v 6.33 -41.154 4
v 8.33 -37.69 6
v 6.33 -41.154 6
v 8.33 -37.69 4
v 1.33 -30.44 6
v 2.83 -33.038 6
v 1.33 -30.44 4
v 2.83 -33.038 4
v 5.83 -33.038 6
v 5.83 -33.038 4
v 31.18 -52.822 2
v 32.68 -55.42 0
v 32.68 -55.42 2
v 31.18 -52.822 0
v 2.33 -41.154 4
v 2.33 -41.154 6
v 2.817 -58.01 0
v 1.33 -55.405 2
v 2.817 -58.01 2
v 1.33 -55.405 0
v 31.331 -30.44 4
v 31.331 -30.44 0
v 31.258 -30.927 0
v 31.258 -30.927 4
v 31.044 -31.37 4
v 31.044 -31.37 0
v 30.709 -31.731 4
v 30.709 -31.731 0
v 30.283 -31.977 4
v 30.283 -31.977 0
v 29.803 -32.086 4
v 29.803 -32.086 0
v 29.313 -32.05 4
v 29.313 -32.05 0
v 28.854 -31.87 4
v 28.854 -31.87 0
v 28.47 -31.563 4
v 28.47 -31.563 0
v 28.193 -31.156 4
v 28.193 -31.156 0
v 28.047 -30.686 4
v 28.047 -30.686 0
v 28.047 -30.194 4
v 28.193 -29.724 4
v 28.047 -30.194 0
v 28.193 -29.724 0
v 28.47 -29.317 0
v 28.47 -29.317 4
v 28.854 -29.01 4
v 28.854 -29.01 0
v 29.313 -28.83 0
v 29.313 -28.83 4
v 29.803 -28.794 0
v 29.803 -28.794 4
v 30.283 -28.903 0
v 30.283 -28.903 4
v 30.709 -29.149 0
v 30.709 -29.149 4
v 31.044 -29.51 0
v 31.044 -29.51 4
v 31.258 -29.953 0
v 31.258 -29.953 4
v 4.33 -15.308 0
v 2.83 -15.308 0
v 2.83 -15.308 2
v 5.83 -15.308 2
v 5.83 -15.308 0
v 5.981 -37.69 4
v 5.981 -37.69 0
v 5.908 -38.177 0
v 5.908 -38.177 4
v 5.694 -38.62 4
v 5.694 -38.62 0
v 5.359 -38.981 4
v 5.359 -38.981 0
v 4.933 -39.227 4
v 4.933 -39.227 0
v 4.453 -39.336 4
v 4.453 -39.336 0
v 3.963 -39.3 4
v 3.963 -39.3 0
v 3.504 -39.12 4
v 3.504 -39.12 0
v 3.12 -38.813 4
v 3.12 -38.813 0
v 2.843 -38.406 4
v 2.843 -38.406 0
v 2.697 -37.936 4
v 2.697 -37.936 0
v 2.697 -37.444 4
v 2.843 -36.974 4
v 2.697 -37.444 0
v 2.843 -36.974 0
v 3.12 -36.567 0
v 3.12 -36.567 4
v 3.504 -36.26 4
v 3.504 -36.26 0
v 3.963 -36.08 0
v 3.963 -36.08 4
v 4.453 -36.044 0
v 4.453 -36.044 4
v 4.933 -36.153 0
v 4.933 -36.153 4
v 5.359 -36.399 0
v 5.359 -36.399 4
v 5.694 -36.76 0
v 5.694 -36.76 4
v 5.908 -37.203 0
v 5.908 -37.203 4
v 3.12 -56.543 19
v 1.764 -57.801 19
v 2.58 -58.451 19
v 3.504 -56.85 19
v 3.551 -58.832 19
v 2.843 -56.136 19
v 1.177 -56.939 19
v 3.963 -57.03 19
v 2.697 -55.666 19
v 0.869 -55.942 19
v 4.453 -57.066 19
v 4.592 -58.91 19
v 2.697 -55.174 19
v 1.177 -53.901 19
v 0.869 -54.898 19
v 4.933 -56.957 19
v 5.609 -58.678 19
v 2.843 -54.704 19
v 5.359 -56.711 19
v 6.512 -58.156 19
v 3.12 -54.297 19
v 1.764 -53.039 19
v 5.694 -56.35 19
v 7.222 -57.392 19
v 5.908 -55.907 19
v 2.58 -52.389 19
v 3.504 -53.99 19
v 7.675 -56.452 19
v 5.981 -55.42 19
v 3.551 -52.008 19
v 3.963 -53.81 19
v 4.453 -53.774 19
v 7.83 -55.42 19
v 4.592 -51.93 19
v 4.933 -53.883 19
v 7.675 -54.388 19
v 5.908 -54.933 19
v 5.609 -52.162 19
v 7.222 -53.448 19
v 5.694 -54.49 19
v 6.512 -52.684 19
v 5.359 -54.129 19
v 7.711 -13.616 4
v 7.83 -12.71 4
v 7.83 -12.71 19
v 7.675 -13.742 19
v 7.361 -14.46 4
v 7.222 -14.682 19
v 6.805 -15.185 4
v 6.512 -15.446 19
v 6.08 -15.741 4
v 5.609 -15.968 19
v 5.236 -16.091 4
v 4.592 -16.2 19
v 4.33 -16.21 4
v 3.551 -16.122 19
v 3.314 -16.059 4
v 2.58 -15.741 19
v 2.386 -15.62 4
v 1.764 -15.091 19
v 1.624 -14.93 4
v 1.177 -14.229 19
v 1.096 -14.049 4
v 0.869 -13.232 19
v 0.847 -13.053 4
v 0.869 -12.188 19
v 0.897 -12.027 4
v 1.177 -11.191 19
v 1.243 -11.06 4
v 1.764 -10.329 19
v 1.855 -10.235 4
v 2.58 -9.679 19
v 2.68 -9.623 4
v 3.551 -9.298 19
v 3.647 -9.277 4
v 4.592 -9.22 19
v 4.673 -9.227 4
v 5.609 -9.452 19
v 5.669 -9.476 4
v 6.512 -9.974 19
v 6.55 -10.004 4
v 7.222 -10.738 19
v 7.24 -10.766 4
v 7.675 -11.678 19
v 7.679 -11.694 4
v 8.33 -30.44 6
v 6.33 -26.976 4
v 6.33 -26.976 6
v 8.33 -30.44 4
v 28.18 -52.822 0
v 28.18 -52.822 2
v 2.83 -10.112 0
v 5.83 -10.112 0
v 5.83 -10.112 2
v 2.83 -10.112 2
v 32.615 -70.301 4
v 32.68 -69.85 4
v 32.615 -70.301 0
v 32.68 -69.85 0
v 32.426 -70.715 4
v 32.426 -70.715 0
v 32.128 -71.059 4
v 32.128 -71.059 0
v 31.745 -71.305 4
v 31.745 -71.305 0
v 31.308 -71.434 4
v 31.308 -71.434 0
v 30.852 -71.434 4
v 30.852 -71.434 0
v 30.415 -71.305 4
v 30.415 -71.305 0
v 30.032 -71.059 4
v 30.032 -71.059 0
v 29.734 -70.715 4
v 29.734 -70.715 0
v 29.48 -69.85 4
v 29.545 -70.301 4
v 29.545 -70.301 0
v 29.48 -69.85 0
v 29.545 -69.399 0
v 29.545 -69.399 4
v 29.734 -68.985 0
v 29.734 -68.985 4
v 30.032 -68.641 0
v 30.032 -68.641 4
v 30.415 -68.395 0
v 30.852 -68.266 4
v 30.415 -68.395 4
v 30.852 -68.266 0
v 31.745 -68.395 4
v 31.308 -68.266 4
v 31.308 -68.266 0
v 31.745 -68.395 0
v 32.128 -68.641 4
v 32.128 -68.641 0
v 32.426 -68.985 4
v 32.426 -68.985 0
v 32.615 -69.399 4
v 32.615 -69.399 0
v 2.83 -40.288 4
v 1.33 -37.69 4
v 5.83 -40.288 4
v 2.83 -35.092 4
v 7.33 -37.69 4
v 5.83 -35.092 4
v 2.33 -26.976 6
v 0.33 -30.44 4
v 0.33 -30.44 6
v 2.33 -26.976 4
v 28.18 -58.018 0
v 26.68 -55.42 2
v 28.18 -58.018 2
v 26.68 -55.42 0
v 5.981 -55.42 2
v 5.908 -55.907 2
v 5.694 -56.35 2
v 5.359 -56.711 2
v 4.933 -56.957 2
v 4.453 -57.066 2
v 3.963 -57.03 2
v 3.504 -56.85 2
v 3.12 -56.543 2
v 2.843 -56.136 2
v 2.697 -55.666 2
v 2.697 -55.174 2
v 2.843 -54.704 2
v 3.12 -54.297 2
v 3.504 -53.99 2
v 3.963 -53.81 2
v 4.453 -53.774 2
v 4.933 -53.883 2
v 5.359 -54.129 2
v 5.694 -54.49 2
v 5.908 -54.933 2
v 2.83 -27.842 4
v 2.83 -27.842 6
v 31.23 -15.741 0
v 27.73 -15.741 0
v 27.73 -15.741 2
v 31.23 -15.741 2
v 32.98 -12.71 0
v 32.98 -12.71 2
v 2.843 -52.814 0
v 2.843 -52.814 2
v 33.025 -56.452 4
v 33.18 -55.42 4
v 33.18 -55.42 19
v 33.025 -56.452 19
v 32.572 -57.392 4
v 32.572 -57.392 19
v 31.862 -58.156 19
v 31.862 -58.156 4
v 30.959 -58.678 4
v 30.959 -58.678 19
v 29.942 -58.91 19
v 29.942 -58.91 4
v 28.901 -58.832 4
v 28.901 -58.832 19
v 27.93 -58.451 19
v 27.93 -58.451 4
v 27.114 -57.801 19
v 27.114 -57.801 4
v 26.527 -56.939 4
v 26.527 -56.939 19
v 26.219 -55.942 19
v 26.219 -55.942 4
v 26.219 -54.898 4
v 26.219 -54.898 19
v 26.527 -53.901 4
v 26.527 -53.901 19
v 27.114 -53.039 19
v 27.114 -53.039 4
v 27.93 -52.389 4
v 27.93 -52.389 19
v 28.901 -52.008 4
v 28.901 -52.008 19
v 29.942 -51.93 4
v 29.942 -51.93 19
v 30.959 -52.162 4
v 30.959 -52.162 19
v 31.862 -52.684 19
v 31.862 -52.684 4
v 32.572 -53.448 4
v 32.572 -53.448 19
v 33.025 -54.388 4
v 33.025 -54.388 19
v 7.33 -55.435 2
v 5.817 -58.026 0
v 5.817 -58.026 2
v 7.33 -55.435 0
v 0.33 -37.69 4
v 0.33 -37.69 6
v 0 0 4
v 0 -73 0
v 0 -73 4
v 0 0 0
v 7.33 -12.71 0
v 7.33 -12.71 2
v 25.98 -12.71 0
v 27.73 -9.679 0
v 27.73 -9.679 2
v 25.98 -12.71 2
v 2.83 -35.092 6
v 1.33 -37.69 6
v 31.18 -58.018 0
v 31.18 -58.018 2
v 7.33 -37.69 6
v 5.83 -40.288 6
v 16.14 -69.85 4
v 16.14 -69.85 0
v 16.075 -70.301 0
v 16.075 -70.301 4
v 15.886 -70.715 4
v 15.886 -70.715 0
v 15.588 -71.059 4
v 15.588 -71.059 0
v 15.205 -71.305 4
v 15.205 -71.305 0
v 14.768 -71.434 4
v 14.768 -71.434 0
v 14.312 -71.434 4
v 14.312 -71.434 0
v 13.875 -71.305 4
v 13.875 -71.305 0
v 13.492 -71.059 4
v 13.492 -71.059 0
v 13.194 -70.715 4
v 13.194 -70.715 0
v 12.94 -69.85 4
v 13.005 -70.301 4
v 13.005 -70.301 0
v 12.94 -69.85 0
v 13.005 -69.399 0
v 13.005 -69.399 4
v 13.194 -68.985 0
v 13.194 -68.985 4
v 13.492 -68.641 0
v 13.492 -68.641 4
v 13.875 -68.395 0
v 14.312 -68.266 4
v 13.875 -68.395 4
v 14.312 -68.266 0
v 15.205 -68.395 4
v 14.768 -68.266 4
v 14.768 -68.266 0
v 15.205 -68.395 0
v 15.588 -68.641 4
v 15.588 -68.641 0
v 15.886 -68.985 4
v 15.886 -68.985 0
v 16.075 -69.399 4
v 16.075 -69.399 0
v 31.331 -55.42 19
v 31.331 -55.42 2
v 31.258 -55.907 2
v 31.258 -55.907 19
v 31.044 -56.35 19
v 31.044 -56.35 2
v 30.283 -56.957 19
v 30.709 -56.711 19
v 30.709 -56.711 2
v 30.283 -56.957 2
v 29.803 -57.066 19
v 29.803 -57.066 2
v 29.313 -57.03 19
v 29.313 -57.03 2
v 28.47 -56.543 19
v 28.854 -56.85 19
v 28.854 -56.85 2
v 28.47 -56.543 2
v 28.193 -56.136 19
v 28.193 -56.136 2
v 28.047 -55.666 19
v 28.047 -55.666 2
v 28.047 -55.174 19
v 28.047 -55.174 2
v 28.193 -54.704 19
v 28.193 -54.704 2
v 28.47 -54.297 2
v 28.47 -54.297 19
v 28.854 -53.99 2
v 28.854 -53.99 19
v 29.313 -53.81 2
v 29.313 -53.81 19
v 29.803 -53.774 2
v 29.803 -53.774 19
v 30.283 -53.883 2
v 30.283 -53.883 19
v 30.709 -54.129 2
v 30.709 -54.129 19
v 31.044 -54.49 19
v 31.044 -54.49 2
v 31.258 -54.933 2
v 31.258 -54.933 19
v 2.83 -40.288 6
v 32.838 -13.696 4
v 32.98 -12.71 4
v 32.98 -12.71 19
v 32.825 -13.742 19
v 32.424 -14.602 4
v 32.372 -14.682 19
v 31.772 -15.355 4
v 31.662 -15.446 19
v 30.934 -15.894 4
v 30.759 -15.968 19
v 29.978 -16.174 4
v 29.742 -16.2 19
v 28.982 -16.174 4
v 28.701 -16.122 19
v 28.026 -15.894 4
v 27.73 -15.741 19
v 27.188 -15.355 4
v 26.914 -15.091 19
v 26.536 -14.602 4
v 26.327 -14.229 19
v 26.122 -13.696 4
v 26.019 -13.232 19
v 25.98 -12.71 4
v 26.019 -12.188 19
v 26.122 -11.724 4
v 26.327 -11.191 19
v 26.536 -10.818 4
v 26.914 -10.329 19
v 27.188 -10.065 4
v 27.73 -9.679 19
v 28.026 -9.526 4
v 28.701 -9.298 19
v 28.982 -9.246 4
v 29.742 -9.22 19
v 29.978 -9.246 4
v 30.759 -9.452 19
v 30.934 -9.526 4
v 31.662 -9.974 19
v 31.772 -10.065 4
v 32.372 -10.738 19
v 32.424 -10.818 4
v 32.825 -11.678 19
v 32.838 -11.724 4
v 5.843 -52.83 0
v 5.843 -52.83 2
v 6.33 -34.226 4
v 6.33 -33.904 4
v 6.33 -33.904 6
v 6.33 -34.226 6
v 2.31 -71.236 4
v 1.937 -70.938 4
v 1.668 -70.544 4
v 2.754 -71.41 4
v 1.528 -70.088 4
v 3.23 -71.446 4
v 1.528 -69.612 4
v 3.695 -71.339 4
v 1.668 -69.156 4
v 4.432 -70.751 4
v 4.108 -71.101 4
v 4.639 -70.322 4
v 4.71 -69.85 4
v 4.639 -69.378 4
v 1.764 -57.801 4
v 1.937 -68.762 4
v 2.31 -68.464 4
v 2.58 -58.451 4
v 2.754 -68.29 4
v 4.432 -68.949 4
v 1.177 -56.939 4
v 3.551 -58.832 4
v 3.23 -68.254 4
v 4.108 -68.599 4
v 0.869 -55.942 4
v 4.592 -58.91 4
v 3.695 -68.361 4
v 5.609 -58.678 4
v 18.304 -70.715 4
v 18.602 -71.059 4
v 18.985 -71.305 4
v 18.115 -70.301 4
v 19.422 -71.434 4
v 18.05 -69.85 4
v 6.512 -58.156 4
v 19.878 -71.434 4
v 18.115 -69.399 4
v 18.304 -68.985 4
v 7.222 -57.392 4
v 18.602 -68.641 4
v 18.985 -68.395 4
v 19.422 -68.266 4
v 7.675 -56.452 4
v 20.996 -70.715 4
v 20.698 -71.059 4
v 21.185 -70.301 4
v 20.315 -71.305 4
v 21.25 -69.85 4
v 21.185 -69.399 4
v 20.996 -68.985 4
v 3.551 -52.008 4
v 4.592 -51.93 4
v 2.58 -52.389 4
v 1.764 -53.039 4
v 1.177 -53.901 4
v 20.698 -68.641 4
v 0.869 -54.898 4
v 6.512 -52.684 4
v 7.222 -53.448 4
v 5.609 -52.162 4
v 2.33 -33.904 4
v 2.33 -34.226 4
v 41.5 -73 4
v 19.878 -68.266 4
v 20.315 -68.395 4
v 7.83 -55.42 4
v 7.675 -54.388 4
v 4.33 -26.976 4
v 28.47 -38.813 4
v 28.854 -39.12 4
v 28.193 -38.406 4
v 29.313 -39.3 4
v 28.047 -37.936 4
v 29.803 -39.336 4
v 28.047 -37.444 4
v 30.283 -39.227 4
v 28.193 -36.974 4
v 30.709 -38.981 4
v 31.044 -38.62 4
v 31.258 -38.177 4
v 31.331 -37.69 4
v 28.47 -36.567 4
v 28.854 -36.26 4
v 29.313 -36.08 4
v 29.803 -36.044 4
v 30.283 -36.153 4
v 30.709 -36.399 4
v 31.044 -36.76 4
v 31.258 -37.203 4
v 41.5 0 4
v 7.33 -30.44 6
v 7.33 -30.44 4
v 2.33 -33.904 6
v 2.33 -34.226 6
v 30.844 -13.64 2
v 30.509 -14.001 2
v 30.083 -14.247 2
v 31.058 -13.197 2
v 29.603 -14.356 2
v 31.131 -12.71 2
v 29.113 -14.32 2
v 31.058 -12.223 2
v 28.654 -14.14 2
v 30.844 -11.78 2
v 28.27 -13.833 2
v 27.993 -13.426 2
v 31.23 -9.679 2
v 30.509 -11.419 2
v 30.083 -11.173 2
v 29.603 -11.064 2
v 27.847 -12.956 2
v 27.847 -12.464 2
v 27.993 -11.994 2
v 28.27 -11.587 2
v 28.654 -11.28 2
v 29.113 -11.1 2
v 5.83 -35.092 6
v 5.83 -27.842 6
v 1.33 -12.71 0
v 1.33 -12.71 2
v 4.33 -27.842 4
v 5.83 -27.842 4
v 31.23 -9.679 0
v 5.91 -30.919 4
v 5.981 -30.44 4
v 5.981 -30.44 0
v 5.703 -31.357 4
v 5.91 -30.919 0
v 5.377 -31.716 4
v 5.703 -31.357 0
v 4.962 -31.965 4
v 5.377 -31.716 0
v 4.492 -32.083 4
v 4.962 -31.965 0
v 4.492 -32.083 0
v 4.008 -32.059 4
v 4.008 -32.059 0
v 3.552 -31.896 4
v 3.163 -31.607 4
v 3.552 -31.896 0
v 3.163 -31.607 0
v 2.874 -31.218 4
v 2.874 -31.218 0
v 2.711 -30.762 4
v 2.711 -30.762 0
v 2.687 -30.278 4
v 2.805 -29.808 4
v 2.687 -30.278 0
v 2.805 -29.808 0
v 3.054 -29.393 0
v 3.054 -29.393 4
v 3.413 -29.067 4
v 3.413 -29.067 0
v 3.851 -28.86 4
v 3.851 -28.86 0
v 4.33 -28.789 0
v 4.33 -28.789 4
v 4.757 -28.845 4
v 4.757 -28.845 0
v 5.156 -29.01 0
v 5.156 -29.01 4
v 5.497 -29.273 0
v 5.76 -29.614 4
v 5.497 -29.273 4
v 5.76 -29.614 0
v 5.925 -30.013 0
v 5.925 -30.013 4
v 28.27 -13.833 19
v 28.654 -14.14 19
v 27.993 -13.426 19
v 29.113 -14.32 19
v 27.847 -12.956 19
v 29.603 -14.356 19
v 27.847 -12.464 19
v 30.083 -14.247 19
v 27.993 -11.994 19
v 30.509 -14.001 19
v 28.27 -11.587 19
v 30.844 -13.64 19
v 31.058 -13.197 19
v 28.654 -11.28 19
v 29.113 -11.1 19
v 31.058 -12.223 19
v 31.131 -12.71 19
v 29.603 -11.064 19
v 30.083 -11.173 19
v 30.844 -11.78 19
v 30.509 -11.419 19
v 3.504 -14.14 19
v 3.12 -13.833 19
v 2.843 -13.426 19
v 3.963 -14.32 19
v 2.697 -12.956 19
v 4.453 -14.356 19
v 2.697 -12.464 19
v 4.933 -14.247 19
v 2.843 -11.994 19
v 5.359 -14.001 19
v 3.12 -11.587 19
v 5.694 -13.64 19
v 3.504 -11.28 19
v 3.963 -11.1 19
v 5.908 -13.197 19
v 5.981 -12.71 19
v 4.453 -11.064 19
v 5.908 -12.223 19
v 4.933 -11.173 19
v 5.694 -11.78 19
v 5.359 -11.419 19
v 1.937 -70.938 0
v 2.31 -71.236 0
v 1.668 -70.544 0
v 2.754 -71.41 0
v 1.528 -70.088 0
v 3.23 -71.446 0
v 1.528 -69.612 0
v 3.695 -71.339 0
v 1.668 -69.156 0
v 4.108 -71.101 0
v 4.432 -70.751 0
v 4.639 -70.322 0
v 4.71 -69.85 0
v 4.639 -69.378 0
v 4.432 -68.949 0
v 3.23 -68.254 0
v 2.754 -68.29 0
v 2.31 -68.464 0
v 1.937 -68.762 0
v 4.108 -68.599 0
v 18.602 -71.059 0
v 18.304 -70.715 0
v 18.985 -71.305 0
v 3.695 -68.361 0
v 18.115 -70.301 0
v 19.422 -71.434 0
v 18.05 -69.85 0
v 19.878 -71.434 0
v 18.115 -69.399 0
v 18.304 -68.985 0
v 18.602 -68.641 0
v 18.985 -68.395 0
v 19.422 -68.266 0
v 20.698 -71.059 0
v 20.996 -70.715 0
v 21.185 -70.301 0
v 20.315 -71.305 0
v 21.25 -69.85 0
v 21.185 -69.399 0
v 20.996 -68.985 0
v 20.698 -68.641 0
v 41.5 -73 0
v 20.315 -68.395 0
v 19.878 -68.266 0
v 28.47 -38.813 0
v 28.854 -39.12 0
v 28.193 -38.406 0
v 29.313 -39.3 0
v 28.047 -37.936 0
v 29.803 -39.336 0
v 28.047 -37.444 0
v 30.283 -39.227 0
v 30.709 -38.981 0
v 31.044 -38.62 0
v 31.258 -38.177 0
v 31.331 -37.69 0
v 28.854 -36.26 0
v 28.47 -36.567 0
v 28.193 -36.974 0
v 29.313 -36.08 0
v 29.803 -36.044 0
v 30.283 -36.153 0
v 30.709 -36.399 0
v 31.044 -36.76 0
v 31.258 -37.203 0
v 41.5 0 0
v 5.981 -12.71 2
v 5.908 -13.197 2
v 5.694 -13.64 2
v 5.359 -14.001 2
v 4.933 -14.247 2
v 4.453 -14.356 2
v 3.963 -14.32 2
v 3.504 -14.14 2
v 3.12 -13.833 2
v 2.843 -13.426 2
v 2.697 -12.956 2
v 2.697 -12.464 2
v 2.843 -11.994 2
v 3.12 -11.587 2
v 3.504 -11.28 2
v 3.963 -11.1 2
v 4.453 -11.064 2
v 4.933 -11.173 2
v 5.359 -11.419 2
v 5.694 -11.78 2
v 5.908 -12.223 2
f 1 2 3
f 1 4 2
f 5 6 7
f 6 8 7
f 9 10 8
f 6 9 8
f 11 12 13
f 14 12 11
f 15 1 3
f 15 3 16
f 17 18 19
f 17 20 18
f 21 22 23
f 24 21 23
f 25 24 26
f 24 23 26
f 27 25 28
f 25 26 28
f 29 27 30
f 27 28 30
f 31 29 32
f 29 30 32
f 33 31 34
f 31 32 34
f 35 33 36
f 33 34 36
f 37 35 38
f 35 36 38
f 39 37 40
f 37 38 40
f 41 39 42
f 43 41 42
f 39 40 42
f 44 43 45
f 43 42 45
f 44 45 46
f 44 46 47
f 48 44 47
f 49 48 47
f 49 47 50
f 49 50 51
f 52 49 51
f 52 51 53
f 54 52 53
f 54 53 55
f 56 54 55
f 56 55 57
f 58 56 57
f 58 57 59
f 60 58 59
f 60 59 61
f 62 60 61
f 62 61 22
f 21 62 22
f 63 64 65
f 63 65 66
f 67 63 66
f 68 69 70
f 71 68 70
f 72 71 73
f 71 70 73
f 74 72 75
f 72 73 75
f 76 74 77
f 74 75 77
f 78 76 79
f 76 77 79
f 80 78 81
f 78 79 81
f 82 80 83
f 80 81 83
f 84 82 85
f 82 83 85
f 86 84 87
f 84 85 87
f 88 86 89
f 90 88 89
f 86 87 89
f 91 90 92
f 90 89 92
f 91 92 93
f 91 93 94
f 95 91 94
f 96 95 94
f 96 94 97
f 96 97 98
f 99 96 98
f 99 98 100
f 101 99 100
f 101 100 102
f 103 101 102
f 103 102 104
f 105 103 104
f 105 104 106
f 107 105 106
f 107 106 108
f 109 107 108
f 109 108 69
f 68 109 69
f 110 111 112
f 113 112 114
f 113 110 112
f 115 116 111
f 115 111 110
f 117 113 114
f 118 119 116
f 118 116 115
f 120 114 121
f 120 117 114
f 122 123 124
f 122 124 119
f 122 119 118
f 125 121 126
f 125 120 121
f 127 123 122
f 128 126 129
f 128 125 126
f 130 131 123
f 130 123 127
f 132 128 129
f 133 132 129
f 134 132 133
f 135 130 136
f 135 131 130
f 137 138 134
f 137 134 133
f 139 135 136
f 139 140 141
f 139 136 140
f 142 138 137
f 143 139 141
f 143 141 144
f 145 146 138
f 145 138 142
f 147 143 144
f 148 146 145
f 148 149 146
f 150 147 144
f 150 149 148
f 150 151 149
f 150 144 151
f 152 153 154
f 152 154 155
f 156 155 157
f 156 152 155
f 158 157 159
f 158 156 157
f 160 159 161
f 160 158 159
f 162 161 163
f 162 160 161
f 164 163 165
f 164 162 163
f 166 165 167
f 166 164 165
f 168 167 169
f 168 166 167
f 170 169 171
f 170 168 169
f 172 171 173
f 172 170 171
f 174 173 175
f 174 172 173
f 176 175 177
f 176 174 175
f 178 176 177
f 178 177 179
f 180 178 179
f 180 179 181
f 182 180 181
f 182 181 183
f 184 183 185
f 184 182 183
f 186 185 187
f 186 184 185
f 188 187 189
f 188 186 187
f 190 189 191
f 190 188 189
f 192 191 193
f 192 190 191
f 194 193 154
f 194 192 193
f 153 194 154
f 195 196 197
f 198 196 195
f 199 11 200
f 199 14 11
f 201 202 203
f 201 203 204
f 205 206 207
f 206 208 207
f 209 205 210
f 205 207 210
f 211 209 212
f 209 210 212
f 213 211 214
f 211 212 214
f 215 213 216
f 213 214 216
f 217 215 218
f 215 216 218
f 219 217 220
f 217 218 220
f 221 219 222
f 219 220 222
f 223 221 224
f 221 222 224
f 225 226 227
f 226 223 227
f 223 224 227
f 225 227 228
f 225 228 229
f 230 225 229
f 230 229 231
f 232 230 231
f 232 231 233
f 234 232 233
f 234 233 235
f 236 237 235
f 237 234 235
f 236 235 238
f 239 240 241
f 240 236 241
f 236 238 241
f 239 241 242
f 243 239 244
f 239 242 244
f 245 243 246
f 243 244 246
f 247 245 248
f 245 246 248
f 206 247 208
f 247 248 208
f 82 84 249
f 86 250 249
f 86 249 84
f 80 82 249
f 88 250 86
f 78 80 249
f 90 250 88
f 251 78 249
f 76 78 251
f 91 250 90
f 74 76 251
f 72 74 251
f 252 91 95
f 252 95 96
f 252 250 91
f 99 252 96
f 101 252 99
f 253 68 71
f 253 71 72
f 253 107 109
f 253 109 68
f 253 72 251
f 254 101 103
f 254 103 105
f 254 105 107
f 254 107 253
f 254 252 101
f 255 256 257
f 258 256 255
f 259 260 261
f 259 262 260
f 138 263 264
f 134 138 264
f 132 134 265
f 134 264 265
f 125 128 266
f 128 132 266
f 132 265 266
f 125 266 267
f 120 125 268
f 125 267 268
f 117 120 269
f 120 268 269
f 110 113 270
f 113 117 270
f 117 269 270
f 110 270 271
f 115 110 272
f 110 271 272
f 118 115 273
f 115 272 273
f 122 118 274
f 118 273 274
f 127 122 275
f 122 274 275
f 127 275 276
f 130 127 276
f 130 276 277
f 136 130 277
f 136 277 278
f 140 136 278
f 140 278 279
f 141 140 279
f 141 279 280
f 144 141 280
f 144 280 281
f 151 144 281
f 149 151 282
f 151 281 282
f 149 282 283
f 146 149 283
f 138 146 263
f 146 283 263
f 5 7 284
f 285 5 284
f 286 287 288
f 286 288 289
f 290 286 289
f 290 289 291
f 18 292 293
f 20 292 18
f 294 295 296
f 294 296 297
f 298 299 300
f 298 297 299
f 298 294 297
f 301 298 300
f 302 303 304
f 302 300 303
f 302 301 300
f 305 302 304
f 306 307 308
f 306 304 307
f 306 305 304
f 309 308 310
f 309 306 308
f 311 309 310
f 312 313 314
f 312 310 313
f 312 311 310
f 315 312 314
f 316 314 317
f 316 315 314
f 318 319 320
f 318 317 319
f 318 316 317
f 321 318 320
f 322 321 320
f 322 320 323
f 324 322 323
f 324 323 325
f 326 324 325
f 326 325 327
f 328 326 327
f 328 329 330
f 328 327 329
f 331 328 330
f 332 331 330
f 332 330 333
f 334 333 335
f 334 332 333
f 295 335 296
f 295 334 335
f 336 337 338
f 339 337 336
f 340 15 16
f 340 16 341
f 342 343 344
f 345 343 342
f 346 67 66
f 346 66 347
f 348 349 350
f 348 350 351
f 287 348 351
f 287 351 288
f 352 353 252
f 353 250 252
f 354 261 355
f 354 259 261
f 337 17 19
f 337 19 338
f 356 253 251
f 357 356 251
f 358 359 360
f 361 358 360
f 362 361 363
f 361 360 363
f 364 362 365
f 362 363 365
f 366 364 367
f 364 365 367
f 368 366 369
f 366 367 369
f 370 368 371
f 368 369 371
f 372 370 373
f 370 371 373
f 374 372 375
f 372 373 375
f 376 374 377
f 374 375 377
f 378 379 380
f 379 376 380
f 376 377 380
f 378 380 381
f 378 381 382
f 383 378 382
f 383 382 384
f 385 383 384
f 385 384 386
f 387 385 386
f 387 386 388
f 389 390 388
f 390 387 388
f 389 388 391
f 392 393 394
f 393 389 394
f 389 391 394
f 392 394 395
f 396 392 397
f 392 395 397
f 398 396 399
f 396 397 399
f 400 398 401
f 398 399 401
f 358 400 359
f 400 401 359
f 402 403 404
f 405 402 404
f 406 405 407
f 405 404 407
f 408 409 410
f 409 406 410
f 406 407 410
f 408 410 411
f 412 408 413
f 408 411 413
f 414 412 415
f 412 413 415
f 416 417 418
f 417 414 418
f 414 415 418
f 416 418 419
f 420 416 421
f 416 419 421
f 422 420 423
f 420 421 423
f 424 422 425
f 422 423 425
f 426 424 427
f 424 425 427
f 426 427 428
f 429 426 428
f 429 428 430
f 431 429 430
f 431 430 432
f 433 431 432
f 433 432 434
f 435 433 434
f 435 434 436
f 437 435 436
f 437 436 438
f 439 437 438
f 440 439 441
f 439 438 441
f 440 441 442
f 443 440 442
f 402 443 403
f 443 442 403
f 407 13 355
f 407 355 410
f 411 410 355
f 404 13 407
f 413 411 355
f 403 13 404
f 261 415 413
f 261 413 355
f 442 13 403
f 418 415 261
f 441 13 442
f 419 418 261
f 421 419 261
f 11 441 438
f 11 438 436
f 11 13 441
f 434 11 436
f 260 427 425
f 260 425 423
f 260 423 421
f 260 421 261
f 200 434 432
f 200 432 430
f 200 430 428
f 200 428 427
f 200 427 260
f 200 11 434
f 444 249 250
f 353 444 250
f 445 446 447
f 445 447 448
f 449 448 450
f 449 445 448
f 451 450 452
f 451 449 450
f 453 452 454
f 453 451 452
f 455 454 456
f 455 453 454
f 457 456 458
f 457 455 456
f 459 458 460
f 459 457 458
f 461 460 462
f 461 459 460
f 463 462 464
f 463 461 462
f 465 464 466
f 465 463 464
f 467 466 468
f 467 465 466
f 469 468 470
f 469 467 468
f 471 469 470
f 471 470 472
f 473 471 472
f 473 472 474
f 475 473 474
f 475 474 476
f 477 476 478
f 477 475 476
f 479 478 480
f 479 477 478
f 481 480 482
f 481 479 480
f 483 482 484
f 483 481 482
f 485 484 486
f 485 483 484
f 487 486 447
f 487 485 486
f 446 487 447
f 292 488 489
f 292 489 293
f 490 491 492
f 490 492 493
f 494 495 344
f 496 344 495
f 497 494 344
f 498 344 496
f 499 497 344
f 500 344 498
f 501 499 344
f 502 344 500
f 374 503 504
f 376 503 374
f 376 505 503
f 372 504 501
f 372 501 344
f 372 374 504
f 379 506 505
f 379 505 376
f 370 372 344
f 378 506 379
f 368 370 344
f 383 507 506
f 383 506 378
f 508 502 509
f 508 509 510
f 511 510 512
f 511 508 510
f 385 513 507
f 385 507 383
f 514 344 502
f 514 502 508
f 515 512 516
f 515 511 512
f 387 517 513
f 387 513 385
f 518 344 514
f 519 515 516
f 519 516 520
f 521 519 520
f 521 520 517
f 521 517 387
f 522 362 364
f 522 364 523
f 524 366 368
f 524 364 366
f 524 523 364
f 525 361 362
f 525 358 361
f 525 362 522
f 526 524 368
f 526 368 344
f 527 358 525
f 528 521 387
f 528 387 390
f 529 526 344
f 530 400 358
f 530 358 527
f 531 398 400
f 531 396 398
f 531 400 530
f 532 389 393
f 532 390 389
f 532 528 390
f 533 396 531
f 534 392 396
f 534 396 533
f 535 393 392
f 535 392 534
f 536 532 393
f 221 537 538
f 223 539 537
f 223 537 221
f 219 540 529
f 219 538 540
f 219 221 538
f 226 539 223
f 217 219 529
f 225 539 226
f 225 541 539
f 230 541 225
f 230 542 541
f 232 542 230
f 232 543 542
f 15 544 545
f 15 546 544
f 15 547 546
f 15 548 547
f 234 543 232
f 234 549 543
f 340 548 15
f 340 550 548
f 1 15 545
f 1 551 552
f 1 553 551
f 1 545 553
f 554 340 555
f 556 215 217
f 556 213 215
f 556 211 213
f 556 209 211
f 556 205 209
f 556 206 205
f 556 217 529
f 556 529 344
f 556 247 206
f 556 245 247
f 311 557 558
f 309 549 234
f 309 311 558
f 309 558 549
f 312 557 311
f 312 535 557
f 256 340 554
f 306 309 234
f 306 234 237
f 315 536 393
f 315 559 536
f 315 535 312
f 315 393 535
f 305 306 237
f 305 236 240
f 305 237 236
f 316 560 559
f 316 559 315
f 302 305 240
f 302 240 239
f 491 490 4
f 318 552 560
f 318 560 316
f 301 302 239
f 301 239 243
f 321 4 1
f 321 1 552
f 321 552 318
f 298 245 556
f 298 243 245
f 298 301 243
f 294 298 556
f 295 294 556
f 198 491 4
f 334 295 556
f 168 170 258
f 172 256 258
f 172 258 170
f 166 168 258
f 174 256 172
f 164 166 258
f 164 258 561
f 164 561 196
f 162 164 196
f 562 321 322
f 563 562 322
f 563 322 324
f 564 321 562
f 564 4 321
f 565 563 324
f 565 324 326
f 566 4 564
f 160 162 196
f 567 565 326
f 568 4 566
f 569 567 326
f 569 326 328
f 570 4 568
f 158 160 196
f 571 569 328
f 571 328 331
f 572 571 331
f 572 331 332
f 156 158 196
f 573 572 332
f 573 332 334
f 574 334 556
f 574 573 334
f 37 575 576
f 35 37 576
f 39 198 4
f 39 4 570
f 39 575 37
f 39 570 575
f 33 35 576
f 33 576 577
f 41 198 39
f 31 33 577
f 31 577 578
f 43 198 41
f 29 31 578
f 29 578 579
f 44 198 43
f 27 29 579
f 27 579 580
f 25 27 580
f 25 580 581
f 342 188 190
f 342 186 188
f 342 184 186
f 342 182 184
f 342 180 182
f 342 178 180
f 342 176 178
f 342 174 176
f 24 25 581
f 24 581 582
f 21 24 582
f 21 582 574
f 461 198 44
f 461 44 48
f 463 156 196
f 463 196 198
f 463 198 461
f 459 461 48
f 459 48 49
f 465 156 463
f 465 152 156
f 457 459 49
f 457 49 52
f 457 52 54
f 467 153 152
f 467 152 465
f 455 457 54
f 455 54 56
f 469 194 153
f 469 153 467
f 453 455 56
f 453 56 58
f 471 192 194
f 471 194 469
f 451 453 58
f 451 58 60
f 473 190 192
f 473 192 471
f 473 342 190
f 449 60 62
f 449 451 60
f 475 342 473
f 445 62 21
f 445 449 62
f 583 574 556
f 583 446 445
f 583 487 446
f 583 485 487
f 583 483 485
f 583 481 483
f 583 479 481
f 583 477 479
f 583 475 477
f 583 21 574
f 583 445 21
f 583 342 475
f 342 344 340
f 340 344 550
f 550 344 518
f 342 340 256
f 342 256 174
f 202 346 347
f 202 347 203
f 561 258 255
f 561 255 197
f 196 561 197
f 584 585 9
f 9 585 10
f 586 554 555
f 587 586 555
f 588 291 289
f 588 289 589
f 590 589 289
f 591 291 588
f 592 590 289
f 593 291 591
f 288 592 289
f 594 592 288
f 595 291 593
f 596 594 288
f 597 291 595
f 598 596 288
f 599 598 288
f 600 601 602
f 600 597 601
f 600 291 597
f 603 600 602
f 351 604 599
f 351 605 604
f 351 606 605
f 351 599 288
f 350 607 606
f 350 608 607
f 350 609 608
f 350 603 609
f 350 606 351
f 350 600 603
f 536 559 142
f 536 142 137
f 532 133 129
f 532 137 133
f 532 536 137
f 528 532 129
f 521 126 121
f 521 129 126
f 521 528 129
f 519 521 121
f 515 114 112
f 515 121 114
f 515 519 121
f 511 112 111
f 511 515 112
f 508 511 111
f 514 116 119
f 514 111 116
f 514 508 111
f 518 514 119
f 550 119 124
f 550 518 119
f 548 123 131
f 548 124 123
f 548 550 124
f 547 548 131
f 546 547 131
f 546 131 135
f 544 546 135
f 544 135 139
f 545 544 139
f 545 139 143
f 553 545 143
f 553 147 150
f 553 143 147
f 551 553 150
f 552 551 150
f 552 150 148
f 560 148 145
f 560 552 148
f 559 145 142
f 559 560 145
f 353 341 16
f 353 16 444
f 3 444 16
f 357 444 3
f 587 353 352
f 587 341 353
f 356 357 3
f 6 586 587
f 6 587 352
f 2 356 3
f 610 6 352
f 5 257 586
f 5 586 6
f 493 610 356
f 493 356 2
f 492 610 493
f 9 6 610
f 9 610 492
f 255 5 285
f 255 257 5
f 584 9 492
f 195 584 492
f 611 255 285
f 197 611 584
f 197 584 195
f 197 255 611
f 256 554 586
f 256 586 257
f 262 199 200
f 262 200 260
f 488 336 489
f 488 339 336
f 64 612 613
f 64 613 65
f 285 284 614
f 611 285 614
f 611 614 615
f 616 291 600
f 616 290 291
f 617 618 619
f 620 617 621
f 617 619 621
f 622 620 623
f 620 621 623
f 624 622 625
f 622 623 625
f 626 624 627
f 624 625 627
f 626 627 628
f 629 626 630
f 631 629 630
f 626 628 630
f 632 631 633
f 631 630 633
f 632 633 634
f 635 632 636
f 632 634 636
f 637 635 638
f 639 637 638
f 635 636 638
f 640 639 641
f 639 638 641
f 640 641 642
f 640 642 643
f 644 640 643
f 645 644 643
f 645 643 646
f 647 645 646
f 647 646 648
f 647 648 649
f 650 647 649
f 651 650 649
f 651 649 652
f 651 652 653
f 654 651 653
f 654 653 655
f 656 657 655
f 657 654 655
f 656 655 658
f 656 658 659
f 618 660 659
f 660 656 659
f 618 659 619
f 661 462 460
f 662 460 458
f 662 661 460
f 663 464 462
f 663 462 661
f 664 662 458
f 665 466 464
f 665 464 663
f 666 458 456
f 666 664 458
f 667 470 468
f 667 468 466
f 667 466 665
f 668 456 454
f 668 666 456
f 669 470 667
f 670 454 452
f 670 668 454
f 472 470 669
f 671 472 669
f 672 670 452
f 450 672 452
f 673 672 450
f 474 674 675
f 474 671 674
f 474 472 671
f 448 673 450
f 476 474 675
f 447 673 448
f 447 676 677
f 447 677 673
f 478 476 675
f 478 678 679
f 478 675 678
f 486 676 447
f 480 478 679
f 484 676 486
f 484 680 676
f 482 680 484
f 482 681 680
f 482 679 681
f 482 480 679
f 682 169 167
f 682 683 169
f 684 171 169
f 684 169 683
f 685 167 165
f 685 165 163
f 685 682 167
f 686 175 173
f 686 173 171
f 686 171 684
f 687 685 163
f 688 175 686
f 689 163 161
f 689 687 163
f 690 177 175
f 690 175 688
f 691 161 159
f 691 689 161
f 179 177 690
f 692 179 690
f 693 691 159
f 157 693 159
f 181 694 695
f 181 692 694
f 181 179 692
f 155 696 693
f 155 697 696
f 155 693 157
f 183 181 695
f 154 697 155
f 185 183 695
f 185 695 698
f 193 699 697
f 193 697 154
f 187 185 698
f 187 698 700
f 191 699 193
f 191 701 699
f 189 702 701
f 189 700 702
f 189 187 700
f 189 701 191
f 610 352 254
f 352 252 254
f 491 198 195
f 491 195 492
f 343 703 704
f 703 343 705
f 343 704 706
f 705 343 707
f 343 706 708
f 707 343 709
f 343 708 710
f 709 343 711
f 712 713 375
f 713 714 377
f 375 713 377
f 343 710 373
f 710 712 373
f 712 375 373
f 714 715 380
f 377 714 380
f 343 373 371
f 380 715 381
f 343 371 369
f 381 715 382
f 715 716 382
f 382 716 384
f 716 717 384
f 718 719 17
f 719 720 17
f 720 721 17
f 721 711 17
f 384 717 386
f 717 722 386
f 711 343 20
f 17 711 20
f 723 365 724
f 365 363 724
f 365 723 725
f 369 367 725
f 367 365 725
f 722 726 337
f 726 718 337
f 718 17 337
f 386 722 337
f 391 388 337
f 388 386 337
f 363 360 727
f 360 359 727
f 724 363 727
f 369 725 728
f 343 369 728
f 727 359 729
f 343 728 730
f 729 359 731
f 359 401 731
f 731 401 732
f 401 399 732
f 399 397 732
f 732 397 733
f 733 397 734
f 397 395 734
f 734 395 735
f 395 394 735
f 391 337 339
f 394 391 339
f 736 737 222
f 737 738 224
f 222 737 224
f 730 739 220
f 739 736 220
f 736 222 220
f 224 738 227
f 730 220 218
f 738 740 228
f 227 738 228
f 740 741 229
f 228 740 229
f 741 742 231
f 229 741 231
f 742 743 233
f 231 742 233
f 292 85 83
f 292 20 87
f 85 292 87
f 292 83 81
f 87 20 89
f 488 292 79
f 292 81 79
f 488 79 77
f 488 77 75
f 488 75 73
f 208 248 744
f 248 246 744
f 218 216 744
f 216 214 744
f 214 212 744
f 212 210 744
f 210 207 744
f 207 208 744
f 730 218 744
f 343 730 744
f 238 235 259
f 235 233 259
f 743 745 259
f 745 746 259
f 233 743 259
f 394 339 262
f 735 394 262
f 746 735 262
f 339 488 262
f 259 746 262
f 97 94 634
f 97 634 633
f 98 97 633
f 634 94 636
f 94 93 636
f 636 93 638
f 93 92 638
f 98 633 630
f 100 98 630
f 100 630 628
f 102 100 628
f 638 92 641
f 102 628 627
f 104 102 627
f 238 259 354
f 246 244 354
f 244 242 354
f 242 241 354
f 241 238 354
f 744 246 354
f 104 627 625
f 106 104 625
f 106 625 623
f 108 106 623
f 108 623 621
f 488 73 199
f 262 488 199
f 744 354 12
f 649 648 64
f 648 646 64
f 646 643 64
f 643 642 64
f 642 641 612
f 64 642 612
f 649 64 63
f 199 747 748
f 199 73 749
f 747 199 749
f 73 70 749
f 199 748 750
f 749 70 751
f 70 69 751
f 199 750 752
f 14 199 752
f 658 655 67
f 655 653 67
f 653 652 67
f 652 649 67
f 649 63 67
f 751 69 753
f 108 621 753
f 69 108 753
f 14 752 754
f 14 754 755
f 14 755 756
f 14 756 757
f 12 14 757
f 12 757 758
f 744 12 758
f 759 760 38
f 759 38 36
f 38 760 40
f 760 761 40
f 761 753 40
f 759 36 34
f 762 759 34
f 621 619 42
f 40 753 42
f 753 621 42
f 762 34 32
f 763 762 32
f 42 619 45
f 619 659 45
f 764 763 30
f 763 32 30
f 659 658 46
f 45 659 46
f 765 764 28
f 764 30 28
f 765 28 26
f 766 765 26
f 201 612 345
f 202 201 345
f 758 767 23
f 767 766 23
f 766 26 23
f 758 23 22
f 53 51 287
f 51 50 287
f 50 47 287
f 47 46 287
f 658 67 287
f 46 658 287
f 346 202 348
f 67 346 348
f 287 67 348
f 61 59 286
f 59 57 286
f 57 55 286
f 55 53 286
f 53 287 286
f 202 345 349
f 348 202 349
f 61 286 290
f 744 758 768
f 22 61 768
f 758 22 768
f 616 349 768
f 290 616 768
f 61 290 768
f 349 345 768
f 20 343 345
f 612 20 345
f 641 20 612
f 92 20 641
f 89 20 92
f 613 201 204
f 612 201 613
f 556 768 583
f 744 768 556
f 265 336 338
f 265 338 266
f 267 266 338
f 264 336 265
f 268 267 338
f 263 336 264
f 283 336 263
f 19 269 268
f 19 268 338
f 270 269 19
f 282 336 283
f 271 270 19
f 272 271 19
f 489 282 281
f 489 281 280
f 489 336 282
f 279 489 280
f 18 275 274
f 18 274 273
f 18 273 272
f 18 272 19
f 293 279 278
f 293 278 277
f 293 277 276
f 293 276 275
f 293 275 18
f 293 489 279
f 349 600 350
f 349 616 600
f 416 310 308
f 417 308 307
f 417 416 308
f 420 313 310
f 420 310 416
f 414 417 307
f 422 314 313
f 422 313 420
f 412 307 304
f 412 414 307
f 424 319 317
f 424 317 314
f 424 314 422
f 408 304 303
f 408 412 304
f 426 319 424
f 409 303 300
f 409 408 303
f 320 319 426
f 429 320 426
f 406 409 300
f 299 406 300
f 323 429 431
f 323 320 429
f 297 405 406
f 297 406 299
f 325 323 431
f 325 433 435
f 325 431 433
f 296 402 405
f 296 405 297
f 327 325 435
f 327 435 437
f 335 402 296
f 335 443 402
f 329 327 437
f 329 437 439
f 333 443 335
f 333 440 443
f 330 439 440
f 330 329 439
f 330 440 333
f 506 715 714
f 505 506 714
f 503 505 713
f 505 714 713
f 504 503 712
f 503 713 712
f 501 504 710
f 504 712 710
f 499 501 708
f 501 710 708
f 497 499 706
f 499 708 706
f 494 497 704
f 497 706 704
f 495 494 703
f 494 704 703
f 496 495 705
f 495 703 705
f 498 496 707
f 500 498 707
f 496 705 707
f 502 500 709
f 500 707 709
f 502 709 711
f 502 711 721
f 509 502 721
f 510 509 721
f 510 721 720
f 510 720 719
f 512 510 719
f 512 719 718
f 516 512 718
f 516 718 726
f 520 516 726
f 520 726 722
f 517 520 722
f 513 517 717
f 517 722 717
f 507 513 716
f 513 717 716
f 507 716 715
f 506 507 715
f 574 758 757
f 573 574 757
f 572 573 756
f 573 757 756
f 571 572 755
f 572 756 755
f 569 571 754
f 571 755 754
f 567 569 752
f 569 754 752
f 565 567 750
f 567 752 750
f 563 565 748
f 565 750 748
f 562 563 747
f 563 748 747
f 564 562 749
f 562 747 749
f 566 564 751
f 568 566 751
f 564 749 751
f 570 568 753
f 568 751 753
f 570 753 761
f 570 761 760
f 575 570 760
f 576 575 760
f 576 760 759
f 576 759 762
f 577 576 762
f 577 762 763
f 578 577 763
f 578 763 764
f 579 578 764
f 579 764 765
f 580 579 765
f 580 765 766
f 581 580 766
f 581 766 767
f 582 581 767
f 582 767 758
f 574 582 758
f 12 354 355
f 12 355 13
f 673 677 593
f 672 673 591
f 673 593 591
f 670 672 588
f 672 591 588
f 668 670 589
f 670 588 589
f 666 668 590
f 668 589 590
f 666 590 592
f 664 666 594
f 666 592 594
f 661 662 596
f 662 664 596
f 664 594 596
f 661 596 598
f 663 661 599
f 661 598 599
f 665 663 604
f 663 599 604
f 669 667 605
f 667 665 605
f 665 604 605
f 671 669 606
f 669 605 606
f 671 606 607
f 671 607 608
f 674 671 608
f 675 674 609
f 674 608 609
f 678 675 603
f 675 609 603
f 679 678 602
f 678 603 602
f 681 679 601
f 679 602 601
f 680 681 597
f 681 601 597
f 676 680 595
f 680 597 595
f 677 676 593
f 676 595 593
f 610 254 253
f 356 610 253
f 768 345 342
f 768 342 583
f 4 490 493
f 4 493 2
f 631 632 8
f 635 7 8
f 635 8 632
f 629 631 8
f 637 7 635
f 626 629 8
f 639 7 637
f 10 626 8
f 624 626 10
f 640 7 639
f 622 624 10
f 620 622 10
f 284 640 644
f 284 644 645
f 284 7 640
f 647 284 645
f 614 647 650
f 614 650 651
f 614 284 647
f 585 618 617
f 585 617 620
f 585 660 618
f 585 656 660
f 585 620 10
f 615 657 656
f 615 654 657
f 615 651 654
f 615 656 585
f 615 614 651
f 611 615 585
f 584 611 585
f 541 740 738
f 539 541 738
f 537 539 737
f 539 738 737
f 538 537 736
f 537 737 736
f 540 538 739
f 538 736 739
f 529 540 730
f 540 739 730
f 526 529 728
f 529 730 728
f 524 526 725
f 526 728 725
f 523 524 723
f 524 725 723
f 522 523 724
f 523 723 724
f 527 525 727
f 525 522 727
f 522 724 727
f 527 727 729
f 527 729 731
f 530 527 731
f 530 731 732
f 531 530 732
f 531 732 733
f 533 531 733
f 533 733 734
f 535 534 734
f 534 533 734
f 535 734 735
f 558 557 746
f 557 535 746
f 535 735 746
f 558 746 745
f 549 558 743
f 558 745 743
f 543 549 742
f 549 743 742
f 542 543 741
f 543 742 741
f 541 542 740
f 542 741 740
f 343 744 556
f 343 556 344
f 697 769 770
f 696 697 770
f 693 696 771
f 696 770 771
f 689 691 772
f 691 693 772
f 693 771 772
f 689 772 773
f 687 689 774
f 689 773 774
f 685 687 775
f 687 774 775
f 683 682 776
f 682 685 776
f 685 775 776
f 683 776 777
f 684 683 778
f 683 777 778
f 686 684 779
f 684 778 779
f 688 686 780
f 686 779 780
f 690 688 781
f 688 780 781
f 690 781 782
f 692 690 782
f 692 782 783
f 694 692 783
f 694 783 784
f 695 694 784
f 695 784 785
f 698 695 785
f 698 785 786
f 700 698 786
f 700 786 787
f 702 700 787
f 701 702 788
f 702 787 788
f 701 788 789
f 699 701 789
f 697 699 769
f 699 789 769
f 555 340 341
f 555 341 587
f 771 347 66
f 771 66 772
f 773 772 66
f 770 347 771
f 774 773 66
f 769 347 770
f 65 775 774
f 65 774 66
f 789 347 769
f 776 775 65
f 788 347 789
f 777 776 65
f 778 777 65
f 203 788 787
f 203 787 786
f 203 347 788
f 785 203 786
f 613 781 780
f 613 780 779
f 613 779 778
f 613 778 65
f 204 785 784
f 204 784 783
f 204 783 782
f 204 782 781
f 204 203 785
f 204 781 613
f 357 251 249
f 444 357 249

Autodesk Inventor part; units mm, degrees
ref_plane "YZ Plane" through (0, 0, 0) normal (1, 0, 0) x (0, 1, 0)
ref_plane "XZ Plane" through (0, 0, 0) normal (0, 1, 0) x (-1, 0, 0)
ref_plane "XY Plane" through (0, 0, 0) normal (0, 0, 1) x (1, 0, 0)
sketch "Sketch1" plane through (0, 0, 0) normal (0, 0, 1) x (1, 0, 0)
  line L0 (0, 0) -> (41.5, 0)
  line L1 (41.5, 0) -> (41.5, -73)
  line L2 (41.5, -73) -> (0, -73)
  line L3 (0, -73) -> (0, 0)
  line L4 (0, -73) -> (3.11, -73)
  line L5 (0, -73) -> (3.11, -73) construction
  line L6 (3.11, -73) -> (3.11, -69.85)
  line L7 (3.11, -73) -> (6.26, -73) construction
  line L8 (3.11, -69.85) -> (14.54, -69.85)
  line L9 (14.54, -69.85) -> (19.65, -69.85)
  line L10 (19.65, -69.85) -> (31.08, -69.85)
  circle A0 centre (3.11, -69.85) radius 1.6
  circle A1 centre (14.54, -69.85) radius 1.6
  circle A2 centre (19.65, -69.85) radius 1.6
  circle A3 centre (31.08, -69.85) radius 1.6
  line L11 (3.11, -69.85) -> (3.11, -55.42)
  line L12 (3.11, -69.85) -> (17.54, -69.85) construction
  line L13 (0, -73) -> (4.33, -73)
  line L14 (0, -73) -> (4.33, -73) construction
  line L15 (4.33, -73) -> (4.33, -53.49)
  line L16 (3.11, -55.42) -> (6.6479, -55.42)
  circle A4 centre (4.33, -55.42) radius 1.651
  line L17 (4.33, -55.42) -> (4.33, -37.69)
  line L18 (4.33, -55.42) -> (22.06, -55.42) construction
  line L19 (4.33, -55.42) -> (29.68, -55.42)
  line L20 (4.33, -55.42) -> (29.68, -55.42) construction
  circle A5 centre (4.33, -37.69) radius 1.651
  circle A6 centre (29.68, -55.42) radius 1.651
  line L21 (4.33, -37.69) -> (39.0376, -37.69)
  line L22 (29.68, -55.42) -> (29.68, -25.3245)
  circle A7 centre (29.68, -37.69) radius 1.651
  line L23 (4.33, -37.69) -> (4.33, -30.44)
  line L24 (4.33, -37.69) -> (11.58, -37.69) construction
  line L25 (4.33, -30.44) -> (4.33, -12.71)
  line L26 (4.33, -30.44) -> (29.68, -30.44)
  line L27 (4.33, -30.44) -> (29.68, -30.44) construction
  line L28 (4.33, -12.71) -> (29.68, -12.71)
  circle A8 centre (29.48, -12.71) radius 1.651
  circle A9 centre (4.33, -12.71) radius 1.651
  circle A10 centre (4.33, -30.44) radius 1.651
  circle A11 centre (29.68, -30.44) radius 1.651
  dimension "d0" = 41.5
  dimension "d1" = 73
  dimension "d2" = 3.11
  dimension "d3" = 0
  dimension "d4" = 3.15
  dimension "d5" = 90
  dimension "d6" = 11.43
  dimension "d7" = 90
  dimension "d9" = 5.11
  dimension "d10" = 11.43
  dimension "d11" = 180
  dimension "d12" = 3.2
  dimension "d13" = 3.2
  dimension "d14" = 3.2
  dimension "d15" = 3.2
  dimension "d18" = 14.43
  dimension "d19" = 90
  dimension "d20" = 4.33
  dimension "d21" = 0
  dimension "d22" = 3.302
  dimension "d23" = 17.73
  dimension "d24" = 90
  dimension "d25" = 25.35
  dimension "d26" = 0
  dimension "d27" = 3.302
  dimension "d28" = 3.302
  dimension "d29" = 3.302
  dimension "d30" = 7.25
  dimension "d31" = 90
  dimension "d32" = 17.73
  dimension "d33" = 180
  dimension "d34" = 25.35
  dimension "d35" = 0
  dimension "d36" = 25.35
  dimension "d37" = 3.302
  dimension "d38" = 3.302
  dimension "d39" = 3.302
  dimension "d40" = 3.302
extrude "Extrusion2" add sketch "Sketch1" along normal blind 4 contours L0 L1 L2 L15 A0 A4 L16 L19 A6 L22 A7 A11 L26 A10 L23 A5 L17 L11 L6 L3 | L6 A0 L15 L2 | L11 A4 L15 A0 | L15 L17 A5 L21 A7 L22 A6 L19 L16 A4 | L23 A10 L26 A11 L22 A7 L21 A5
sketch "Sketch3" plane through (0, 0, 4) normal (0, 0, 1) x (1, 0, 0)
  circle A0 centre (4.33, -55.42) radius 1.651 projected
  circle A1 centre (4.33, -55.42) radius 3.5
  circle A2 centre (29.68, -55.42) radius 1.651 projected
  circle A3 centre (29.68, -55.42) radius 3.5
  circle A4 centre (4.33, -12.71) radius 1.651 projected
  circle A5 centre (4.33, -12.71) radius 3.5
  circle A6 centre (29.48, -12.71) radius 1.651 projected
  circle A7 centre (29.48, -12.71) radius 3.5
  point P0 (0, 0)
  dimension "d46" = 7
  dimension "d47" = 7
  dimension "d48" = 7
  dimension "d49" = 7
extrude "Extrusion4" add sketch "Sketch3" along normal blind 15
sketch "Sketch8" plane through (0, 0, 0) normal (0, 0, -1) x (-1, 0, 0)
  circle A0 centre (-4.33, -12.71) radius 1.651 projected
  circle A1 centre (-4.33, -12.71) radius 3
  circle A2 centre (-29.48, -12.71) radius 1.651 projected
  circle A3 centre (-29.48, -12.71) radius 3
  circle A4 centre (-29.68, -55.42) radius 1.651 projected
  circle A5 centre (-29.68, -55.42) radius 3
  circle A6 centre (-4.33, -55.42) radius 1.651 projected
  circle A7 centre (-4.33, -55.42) radius 3
  line L0 (-1.33, -12.71) -> (-2.83, -15.3081)
  line L1 (-2.83, -15.3081) -> (-5.83, -15.3081)
  line L2 (-5.83, -15.3081) -> (-7.33, -12.71)
  line L3 (-7.33, -12.71) -> (-5.83, -10.1119)
  line L4 (-5.83, -10.1119) -> (-2.83, -10.1119)
  line L5 (-2.83, -10.1119) -> (-1.33, -12.71)
  circle A8 centre (-29.48, -12.71) radius 3.5 projected
  line L6 (-25.98, -12.71) -> (-27.73, -15.7411)
  line L7 (-27.73, -15.7411) -> (-31.23, -15.7411)
  line L8 (-31.23, -15.7411) -> (-32.98, -12.71)
  line L9 (-32.98, -12.71) -> (-31.23, -9.6789)
  line L10 (-31.23, -9.6789) -> (-27.73, -9.6789)
  line L11 (-27.73, -9.6789) -> (-25.98, -12.71)
  line L12 (-26.68, -55.42) -> (-28.18, -58.0181)
  line L13 (-28.18, -58.0181) -> (-31.18, -58.0181)
  line L14 (-31.18, -58.0181) -> (-32.68, -55.42)
  line L15 (-32.68, -55.42) -> (-31.18, -52.8219)
  line L16 (-31.18, -52.8219) -> (-28.18, -52.8219)
  line L17 (-28.18, -52.8219) -> (-26.68, -55.42)
  line L18 (-1.33, -55.405) -> (-2.817, -58.0105)
  line L19 (-2.817, -58.0105) -> (-5.817, -58.0256)
  line L20 (-5.817, -58.0256) -> (-7.33, -55.435)
  line L21 (-7.33, -55.435) -> (-5.843, -52.8295)
  line L22 (-5.843, -52.8295) -> (-2.843, -52.8144)
  line L23 (-2.843, -52.8144) -> (-1.33, -55.405)
  point P0 (0, 0)
  dimension "d53" = 6
  dimension "d55" = 6
  dimension "d56" = 6
  dimension "d54" = 6
extrude "Extrusion5" cut sketch "Sketch8" against normal blind 2 contours L0 L1 L2 L3 L4 L5 | A2 | A3 | L12 L13 L14 L15 L16 L17 | L18 L19 L20 L21 L22 L23 | L6 L7 L8 L9 L10 L11
sketch "Sketch9" plane through (0, 0, 4) normal (0, 0, 1) x (1, 0, 0)
  circle A0 centre (4.33, -30.44) radius 1.651 projected
  circle A1 centre (4.33, -30.44) radius 1.651
  circle A2 centre (4.33, -37.69) radius 1.651 projected
  circle A3 centre (4.33, -37.69) radius 1.651
  line L0 (7.33, -30.44) -> (5.83, -33.0381)
  line L1 (5.83, -33.0381) -> (2.83, -33.0381)
  line L2 (2.83, -33.0381) -> (1.33, -30.44)
  line L3 (1.33, -30.44) -> (2.83, -27.8419)
  line L4 (2.83, -27.8419) -> (5.83, -27.8419)
  line L5 (5.83, -27.8419) -> (7.33, -30.44)
  line L6 (7.33, -37.69) -> (5.83, -40.2881)
  line L7 (5.83, -40.2881) -> (2.83, -40.2881)
  line L8 (2.83, -40.2881) -> (1.33, -37.69)
  line L9 (1.33, -37.69) -> (2.83, -35.0919)
  line L10 (2.83, -35.0919) -> (5.83, -35.0919)
  line L11 (5.83, -35.0919) -> (7.33, -37.69)
  line L12 (8.33, -30.44) -> (6.33, -33.9041)
  line L13 (6.33, -33.9041) -> (2.33, -33.9041)
  line L14 (2.33, -33.9041) -> (0.33, -30.44)
  line L15 (0.33, -30.44) -> (2.33, -26.9759)
  line L16 (2.33, -26.9759) -> (6.33, -26.9759)
  line L17 (6.33, -26.9759) -> (8.33, -30.44)
  line L18 (8.33, -37.69) -> (6.33, -41.1541)
  line L19 (6.33, -41.1541) -> (2.33, -41.1541)
  line L20 (2.33, -41.1541) -> (0.33, -37.69)
  line L21 (0.33, -37.69) -> (2.33, -34.2259)
  line L22 (2.33, -34.2259) -> (6.33, -34.2259)
  line L23 (6.33, -34.2259) -> (8.33, -37.69)
  line L24 (6.33, -33.9041) -> (6.33, -34.2259)
  line L25 (2.33, -33.9041) -> (2.33, -34.2259)
  point P0 (0, 0)
  dimension "d59" = 3.302
  dimension "d60" = 3.302
extrude "Extrusion6" add sketch "Sketch9" along normal blind 2 contours L12 L13 L14 L15 L16 L17 | L24 L22 L25 L13 | L23 L18 L19 L20 L21 L22
properties part number "mountMount"
